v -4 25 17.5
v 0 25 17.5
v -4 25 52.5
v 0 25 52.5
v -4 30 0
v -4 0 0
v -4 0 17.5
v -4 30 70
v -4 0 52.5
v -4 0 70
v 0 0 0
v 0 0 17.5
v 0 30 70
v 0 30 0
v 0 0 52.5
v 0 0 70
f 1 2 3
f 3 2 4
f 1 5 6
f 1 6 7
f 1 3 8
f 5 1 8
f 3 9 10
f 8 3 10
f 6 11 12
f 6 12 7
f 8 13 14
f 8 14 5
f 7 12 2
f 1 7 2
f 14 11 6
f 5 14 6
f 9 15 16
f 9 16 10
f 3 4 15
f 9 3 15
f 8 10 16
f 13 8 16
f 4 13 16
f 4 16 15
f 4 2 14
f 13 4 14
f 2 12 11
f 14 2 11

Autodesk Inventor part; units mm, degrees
ref_plane "YZ Plane" through (0, 0, 0) normal (1, 0, 0) x (0, 1, 0)
ref_plane "XZ Plane" through (0, 0, 0) normal (0, 1, 0) x (-1, 0, 0)
ref_plane "XY Plane" through (0, 0, 0) normal (0, 0, 1) x (1, 0, 0)
sketch "Эскиз1" plane through (0, 0, 0) normal (0, 1, 0) x (-1, 0, 0)
  line L0 (0, 0) -> (4, 0)
  line L1 (4, 0) -> (4, 70)
  line L2 (4, 70) -> (0, 70)
  line L3 (0, 70) -> (0, 0)
  dimension "d0" = 4
  dimension "d1" = 70
extrude "Выдавливание1" add sketch "Эскиз1" along normal blind 30
sketch "Эскиз2" plane through (0, 0, 70) normal (1, 0, 0) x (0, 0, -1)
  line L0 (70, 0) -> (0, 0) projected
  line L1 (17.5, 0) -> (52.5, 0)
  line L2 (52.5, 0) -> (52.5, 25)
  line L3 (52.5, 25) -> (17.5, 25)
  line L4 (17.5, 25) -> (17.5, 0)
  point P0 (35, 0)
  dimension "d4" = 35
  dimension "d5" = 25
extrude "Выдавливание2" cut sketch "Эскиз2" against normal blind 30
properties part number "перед"
